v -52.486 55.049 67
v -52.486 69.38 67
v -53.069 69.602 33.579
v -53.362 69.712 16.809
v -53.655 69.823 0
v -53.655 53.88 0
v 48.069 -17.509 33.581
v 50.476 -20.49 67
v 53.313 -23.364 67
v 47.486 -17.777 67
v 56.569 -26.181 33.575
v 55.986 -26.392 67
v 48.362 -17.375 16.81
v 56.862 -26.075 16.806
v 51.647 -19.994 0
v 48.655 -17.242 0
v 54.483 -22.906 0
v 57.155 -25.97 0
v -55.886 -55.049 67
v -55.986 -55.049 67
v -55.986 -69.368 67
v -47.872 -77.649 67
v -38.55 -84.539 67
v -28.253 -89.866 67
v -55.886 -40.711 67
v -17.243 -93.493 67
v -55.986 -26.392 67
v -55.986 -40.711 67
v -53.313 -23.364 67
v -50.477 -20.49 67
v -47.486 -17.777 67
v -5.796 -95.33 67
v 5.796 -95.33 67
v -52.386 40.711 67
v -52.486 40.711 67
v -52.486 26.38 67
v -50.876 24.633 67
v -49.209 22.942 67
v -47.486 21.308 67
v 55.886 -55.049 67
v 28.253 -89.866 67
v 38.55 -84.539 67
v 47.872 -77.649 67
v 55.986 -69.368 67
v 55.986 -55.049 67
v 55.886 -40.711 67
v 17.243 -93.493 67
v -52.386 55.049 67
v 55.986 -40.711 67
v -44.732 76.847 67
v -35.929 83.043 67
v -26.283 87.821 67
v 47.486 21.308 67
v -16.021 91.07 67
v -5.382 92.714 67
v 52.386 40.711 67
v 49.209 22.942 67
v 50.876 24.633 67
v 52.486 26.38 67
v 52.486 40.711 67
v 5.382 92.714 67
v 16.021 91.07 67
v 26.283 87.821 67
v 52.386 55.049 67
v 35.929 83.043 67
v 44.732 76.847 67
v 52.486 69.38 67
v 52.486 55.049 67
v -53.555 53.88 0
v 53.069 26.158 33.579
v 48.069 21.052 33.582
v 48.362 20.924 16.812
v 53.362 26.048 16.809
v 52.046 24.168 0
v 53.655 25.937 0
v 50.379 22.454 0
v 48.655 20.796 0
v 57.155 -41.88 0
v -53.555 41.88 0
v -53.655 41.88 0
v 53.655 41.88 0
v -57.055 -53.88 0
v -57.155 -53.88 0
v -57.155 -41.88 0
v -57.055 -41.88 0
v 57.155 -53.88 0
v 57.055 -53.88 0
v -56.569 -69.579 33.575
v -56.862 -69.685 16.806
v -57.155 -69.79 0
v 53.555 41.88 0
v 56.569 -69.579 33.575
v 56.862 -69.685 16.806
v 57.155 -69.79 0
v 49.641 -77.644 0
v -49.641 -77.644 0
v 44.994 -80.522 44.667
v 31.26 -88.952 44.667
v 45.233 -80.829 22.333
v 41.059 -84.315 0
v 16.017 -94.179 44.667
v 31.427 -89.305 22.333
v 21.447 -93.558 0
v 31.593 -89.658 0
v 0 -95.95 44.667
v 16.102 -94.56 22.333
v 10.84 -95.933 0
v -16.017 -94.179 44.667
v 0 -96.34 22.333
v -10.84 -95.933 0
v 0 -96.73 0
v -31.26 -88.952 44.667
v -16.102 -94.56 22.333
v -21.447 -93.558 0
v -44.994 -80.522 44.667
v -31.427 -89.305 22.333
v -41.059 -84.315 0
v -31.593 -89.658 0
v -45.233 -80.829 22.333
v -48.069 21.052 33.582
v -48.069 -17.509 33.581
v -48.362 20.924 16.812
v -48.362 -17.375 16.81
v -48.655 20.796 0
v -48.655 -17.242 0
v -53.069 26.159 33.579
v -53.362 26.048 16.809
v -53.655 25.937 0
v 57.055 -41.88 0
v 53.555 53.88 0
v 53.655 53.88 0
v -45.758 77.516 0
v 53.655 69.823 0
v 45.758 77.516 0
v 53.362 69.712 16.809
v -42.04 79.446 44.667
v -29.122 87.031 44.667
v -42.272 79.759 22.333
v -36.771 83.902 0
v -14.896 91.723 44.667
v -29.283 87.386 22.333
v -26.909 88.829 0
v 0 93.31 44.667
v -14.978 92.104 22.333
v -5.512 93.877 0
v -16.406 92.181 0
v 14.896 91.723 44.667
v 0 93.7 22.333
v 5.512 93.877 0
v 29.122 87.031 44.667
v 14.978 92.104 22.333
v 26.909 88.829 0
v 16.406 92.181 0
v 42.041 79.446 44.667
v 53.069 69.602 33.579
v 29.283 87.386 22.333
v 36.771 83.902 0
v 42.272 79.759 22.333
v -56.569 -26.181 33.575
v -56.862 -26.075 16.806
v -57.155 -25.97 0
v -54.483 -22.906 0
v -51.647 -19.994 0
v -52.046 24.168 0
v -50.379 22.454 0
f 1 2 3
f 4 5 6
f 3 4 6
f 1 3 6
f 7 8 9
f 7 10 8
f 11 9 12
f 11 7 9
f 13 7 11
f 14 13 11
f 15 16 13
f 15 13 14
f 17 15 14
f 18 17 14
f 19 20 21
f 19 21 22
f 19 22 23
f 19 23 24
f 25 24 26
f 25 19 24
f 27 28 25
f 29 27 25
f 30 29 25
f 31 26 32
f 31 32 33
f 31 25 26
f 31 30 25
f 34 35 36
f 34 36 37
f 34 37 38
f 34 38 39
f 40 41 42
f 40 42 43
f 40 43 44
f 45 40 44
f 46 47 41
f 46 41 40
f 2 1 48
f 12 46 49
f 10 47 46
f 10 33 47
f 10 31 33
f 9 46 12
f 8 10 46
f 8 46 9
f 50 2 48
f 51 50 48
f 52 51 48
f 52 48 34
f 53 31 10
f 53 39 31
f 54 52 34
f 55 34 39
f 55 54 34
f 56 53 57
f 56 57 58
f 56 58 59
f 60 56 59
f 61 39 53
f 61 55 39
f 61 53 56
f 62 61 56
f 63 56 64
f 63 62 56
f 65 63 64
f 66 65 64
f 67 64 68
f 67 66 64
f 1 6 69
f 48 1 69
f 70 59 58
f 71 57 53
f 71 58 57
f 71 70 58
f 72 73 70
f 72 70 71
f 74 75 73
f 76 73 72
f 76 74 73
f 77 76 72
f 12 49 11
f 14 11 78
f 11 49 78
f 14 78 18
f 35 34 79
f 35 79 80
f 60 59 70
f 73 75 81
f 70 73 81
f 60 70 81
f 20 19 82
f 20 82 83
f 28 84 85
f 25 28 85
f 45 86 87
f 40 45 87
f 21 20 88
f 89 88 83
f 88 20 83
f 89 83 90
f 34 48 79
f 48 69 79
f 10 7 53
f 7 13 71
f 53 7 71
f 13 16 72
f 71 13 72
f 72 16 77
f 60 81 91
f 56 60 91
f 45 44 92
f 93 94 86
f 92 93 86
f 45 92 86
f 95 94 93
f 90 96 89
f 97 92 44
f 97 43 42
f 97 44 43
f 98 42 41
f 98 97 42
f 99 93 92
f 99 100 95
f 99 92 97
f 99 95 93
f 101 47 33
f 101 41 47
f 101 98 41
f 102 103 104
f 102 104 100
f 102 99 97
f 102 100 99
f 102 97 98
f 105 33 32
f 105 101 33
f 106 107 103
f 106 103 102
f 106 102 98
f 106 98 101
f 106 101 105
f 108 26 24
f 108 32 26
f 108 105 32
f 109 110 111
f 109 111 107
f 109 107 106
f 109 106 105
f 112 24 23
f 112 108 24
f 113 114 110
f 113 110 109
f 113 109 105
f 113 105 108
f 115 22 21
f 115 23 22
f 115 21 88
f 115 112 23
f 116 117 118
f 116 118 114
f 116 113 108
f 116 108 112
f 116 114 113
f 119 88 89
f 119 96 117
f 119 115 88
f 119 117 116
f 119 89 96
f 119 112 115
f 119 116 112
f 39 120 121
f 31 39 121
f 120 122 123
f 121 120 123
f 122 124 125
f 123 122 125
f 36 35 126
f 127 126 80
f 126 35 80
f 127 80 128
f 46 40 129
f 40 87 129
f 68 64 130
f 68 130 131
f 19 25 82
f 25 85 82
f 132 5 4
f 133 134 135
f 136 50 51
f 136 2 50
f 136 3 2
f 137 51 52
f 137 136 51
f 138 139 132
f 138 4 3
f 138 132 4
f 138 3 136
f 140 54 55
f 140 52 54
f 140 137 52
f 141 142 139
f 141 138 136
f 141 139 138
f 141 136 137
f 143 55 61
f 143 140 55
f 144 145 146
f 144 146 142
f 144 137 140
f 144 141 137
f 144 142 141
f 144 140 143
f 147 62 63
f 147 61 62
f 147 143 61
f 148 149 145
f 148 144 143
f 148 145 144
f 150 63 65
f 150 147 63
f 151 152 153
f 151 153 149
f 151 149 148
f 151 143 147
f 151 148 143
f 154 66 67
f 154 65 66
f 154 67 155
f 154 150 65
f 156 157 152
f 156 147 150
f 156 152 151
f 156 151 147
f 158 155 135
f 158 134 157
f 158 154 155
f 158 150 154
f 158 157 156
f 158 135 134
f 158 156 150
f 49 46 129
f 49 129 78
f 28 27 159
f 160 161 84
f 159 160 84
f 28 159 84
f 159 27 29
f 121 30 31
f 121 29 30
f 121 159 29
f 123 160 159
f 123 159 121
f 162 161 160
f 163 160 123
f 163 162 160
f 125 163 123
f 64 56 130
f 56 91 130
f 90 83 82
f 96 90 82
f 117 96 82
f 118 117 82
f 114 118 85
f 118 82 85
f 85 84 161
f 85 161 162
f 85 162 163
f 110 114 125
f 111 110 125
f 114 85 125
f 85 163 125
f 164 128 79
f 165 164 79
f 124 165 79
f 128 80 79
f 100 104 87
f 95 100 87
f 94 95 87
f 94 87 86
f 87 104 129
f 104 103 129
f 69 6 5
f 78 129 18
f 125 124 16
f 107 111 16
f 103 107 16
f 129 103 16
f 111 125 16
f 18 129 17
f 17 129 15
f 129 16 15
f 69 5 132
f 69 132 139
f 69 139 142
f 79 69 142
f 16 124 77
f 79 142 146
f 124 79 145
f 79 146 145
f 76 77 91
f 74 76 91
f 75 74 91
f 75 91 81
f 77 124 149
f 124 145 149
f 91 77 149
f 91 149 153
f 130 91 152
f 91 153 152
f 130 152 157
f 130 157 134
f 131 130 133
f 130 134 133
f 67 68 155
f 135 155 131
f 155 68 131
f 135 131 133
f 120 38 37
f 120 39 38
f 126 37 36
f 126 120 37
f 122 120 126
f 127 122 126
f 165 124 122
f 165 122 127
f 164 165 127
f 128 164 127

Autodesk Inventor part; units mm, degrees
sketch "Skizze_1" plane through (0, 0, 0) normal (0, 0, 1) x (1, 0, 0)
  line L0 (-57.155, -41.88) -> (-57.055, -41.88)
  line L1 (-57.055, -41.88) -> (-57.055, -53.88)
  line L2 (-57.055, -53.88) -> (-57.155, -53.88)
  line L3 (-57.155, -53.88) -> (-57.155, -69.7905)
  arc A0 (-57.155, -69.7905) -> (57.155, -69.7905) centre (0, -22.63) ccw
  line L4 (57.155, -69.7905) -> (57.155, -53.88)
  line L5 (57.155, -53.88) -> (57.055, -53.88)
  line L6 (57.055, -53.88) -> (57.055, -41.88)
  line L7 (57.055, -41.88) -> (57.155, -41.88)
  line L8 (57.155, -41.88) -> (57.155, -25.9695)
  arc A1 (57.155, -25.9695) -> (48.655, -17.2417) centre (0, -73.13) ccw
  line L9 (48.655, -17.2417) -> (48.655, 20.7961)
  arc A2 (48.655, 20.7961) -> (53.655, 25.9369) centre (0, 73.12) ccw
  line L10 (53.655, 25.9369) -> (53.655, 41.88)
  line L11 (53.655, 41.88) -> (53.555, 41.88)
  line L12 (53.555, 41.88) -> (53.555, 53.88)
  line L13 (53.555, 53.88) -> (53.655, 53.88)
  line L14 (53.655, 53.88) -> (53.655, 69.8231)
  arc A3 (53.655, 69.8231) -> (-53.655, 69.8231) centre (0, 22.64) ccw
  line L15 (-53.655, 69.8231) -> (-53.655, 53.88)
  line L16 (-53.655, 53.88) -> (-53.555, 53.88)
  line L17 (-53.555, 53.88) -> (-53.555, 41.88)
  line L18 (-53.555, 41.88) -> (-53.655, 41.88)
  line L19 (-53.655, 41.88) -> (-53.655, 25.9369)
  arc A4 (-53.655, 25.9369) -> (-48.655, 20.7961) centre (0, 73.12) ccw
  line L20 (-48.655, 20.7961) -> (-48.655, -17.2417)
  arc A5 (-48.655, -17.2417) -> (-57.155, -25.9695) centre (0, -73.13) ccw
  line L21 (-57.155, -25.9695) -> (-57.155, -41.88)
extrude "Extrusion1" add sketch "Skizze_1" along normal blind 67 draft -1
ref_plane "EPDOPPELNUT2_XY" through (0, 47.88, 0) normal (0, 0, 1) x (1, 0, 0)
ref_plane "EPDOPPELNUT2_YZ" through (0, 47.88, 0) normal (1, 0, 0) x (0, 1, 0)
ref_plane "EPDOPPELNUT2_ZX" through (0, 47.88, 0) normal (0, 1, 0) x (0, 0, 1)
ref_plane "EPDOPPROFIL_XY" through (0, 47.88, 67) normal (0, 0, 1) x (1, 0, 0)
ref_plane "EPDOPPROFIL_YZ" through (0, 47.88, 67) normal (1, 0, 0) x (0, 1, 0)
ref_plane "EPDOPPROFIL_ZX" through (0, 47.88, 67) normal (0, 1, 0) x (0, 0, 1)
ref_plane "EPFUNKTIONSPR2_XY" through (0, -47.88, 0) normal (0, 0, 1) x (1, 0, 0)
ref_plane "EPFUNKTIONSPR2_YZ" through (0, -47.88, 0) normal (1, 0, 0) x (0, 1, 0)
ref_plane "EPFUNKTIONSPR2_ZX" through (0, -47.88, 0) normal (0, 1, 0) x (0, 0, 1)
ref_plane "EPKONPROFIL_XY" through (0, -47.88, 67) normal (0, 0, 1) x (1, 0, 0)
ref_plane "EPKONPROFIL_YZ" through (0, -47.88, 67) normal (1, 0, 0) x (0, 1, 0)
ref_plane "EPKONPROFIL_ZX" through (0, -47.88, 67) normal (0, 1, 0) x (0, 0, 1)
properties part number "LZ80_Gehaeuse_Parallelform"
